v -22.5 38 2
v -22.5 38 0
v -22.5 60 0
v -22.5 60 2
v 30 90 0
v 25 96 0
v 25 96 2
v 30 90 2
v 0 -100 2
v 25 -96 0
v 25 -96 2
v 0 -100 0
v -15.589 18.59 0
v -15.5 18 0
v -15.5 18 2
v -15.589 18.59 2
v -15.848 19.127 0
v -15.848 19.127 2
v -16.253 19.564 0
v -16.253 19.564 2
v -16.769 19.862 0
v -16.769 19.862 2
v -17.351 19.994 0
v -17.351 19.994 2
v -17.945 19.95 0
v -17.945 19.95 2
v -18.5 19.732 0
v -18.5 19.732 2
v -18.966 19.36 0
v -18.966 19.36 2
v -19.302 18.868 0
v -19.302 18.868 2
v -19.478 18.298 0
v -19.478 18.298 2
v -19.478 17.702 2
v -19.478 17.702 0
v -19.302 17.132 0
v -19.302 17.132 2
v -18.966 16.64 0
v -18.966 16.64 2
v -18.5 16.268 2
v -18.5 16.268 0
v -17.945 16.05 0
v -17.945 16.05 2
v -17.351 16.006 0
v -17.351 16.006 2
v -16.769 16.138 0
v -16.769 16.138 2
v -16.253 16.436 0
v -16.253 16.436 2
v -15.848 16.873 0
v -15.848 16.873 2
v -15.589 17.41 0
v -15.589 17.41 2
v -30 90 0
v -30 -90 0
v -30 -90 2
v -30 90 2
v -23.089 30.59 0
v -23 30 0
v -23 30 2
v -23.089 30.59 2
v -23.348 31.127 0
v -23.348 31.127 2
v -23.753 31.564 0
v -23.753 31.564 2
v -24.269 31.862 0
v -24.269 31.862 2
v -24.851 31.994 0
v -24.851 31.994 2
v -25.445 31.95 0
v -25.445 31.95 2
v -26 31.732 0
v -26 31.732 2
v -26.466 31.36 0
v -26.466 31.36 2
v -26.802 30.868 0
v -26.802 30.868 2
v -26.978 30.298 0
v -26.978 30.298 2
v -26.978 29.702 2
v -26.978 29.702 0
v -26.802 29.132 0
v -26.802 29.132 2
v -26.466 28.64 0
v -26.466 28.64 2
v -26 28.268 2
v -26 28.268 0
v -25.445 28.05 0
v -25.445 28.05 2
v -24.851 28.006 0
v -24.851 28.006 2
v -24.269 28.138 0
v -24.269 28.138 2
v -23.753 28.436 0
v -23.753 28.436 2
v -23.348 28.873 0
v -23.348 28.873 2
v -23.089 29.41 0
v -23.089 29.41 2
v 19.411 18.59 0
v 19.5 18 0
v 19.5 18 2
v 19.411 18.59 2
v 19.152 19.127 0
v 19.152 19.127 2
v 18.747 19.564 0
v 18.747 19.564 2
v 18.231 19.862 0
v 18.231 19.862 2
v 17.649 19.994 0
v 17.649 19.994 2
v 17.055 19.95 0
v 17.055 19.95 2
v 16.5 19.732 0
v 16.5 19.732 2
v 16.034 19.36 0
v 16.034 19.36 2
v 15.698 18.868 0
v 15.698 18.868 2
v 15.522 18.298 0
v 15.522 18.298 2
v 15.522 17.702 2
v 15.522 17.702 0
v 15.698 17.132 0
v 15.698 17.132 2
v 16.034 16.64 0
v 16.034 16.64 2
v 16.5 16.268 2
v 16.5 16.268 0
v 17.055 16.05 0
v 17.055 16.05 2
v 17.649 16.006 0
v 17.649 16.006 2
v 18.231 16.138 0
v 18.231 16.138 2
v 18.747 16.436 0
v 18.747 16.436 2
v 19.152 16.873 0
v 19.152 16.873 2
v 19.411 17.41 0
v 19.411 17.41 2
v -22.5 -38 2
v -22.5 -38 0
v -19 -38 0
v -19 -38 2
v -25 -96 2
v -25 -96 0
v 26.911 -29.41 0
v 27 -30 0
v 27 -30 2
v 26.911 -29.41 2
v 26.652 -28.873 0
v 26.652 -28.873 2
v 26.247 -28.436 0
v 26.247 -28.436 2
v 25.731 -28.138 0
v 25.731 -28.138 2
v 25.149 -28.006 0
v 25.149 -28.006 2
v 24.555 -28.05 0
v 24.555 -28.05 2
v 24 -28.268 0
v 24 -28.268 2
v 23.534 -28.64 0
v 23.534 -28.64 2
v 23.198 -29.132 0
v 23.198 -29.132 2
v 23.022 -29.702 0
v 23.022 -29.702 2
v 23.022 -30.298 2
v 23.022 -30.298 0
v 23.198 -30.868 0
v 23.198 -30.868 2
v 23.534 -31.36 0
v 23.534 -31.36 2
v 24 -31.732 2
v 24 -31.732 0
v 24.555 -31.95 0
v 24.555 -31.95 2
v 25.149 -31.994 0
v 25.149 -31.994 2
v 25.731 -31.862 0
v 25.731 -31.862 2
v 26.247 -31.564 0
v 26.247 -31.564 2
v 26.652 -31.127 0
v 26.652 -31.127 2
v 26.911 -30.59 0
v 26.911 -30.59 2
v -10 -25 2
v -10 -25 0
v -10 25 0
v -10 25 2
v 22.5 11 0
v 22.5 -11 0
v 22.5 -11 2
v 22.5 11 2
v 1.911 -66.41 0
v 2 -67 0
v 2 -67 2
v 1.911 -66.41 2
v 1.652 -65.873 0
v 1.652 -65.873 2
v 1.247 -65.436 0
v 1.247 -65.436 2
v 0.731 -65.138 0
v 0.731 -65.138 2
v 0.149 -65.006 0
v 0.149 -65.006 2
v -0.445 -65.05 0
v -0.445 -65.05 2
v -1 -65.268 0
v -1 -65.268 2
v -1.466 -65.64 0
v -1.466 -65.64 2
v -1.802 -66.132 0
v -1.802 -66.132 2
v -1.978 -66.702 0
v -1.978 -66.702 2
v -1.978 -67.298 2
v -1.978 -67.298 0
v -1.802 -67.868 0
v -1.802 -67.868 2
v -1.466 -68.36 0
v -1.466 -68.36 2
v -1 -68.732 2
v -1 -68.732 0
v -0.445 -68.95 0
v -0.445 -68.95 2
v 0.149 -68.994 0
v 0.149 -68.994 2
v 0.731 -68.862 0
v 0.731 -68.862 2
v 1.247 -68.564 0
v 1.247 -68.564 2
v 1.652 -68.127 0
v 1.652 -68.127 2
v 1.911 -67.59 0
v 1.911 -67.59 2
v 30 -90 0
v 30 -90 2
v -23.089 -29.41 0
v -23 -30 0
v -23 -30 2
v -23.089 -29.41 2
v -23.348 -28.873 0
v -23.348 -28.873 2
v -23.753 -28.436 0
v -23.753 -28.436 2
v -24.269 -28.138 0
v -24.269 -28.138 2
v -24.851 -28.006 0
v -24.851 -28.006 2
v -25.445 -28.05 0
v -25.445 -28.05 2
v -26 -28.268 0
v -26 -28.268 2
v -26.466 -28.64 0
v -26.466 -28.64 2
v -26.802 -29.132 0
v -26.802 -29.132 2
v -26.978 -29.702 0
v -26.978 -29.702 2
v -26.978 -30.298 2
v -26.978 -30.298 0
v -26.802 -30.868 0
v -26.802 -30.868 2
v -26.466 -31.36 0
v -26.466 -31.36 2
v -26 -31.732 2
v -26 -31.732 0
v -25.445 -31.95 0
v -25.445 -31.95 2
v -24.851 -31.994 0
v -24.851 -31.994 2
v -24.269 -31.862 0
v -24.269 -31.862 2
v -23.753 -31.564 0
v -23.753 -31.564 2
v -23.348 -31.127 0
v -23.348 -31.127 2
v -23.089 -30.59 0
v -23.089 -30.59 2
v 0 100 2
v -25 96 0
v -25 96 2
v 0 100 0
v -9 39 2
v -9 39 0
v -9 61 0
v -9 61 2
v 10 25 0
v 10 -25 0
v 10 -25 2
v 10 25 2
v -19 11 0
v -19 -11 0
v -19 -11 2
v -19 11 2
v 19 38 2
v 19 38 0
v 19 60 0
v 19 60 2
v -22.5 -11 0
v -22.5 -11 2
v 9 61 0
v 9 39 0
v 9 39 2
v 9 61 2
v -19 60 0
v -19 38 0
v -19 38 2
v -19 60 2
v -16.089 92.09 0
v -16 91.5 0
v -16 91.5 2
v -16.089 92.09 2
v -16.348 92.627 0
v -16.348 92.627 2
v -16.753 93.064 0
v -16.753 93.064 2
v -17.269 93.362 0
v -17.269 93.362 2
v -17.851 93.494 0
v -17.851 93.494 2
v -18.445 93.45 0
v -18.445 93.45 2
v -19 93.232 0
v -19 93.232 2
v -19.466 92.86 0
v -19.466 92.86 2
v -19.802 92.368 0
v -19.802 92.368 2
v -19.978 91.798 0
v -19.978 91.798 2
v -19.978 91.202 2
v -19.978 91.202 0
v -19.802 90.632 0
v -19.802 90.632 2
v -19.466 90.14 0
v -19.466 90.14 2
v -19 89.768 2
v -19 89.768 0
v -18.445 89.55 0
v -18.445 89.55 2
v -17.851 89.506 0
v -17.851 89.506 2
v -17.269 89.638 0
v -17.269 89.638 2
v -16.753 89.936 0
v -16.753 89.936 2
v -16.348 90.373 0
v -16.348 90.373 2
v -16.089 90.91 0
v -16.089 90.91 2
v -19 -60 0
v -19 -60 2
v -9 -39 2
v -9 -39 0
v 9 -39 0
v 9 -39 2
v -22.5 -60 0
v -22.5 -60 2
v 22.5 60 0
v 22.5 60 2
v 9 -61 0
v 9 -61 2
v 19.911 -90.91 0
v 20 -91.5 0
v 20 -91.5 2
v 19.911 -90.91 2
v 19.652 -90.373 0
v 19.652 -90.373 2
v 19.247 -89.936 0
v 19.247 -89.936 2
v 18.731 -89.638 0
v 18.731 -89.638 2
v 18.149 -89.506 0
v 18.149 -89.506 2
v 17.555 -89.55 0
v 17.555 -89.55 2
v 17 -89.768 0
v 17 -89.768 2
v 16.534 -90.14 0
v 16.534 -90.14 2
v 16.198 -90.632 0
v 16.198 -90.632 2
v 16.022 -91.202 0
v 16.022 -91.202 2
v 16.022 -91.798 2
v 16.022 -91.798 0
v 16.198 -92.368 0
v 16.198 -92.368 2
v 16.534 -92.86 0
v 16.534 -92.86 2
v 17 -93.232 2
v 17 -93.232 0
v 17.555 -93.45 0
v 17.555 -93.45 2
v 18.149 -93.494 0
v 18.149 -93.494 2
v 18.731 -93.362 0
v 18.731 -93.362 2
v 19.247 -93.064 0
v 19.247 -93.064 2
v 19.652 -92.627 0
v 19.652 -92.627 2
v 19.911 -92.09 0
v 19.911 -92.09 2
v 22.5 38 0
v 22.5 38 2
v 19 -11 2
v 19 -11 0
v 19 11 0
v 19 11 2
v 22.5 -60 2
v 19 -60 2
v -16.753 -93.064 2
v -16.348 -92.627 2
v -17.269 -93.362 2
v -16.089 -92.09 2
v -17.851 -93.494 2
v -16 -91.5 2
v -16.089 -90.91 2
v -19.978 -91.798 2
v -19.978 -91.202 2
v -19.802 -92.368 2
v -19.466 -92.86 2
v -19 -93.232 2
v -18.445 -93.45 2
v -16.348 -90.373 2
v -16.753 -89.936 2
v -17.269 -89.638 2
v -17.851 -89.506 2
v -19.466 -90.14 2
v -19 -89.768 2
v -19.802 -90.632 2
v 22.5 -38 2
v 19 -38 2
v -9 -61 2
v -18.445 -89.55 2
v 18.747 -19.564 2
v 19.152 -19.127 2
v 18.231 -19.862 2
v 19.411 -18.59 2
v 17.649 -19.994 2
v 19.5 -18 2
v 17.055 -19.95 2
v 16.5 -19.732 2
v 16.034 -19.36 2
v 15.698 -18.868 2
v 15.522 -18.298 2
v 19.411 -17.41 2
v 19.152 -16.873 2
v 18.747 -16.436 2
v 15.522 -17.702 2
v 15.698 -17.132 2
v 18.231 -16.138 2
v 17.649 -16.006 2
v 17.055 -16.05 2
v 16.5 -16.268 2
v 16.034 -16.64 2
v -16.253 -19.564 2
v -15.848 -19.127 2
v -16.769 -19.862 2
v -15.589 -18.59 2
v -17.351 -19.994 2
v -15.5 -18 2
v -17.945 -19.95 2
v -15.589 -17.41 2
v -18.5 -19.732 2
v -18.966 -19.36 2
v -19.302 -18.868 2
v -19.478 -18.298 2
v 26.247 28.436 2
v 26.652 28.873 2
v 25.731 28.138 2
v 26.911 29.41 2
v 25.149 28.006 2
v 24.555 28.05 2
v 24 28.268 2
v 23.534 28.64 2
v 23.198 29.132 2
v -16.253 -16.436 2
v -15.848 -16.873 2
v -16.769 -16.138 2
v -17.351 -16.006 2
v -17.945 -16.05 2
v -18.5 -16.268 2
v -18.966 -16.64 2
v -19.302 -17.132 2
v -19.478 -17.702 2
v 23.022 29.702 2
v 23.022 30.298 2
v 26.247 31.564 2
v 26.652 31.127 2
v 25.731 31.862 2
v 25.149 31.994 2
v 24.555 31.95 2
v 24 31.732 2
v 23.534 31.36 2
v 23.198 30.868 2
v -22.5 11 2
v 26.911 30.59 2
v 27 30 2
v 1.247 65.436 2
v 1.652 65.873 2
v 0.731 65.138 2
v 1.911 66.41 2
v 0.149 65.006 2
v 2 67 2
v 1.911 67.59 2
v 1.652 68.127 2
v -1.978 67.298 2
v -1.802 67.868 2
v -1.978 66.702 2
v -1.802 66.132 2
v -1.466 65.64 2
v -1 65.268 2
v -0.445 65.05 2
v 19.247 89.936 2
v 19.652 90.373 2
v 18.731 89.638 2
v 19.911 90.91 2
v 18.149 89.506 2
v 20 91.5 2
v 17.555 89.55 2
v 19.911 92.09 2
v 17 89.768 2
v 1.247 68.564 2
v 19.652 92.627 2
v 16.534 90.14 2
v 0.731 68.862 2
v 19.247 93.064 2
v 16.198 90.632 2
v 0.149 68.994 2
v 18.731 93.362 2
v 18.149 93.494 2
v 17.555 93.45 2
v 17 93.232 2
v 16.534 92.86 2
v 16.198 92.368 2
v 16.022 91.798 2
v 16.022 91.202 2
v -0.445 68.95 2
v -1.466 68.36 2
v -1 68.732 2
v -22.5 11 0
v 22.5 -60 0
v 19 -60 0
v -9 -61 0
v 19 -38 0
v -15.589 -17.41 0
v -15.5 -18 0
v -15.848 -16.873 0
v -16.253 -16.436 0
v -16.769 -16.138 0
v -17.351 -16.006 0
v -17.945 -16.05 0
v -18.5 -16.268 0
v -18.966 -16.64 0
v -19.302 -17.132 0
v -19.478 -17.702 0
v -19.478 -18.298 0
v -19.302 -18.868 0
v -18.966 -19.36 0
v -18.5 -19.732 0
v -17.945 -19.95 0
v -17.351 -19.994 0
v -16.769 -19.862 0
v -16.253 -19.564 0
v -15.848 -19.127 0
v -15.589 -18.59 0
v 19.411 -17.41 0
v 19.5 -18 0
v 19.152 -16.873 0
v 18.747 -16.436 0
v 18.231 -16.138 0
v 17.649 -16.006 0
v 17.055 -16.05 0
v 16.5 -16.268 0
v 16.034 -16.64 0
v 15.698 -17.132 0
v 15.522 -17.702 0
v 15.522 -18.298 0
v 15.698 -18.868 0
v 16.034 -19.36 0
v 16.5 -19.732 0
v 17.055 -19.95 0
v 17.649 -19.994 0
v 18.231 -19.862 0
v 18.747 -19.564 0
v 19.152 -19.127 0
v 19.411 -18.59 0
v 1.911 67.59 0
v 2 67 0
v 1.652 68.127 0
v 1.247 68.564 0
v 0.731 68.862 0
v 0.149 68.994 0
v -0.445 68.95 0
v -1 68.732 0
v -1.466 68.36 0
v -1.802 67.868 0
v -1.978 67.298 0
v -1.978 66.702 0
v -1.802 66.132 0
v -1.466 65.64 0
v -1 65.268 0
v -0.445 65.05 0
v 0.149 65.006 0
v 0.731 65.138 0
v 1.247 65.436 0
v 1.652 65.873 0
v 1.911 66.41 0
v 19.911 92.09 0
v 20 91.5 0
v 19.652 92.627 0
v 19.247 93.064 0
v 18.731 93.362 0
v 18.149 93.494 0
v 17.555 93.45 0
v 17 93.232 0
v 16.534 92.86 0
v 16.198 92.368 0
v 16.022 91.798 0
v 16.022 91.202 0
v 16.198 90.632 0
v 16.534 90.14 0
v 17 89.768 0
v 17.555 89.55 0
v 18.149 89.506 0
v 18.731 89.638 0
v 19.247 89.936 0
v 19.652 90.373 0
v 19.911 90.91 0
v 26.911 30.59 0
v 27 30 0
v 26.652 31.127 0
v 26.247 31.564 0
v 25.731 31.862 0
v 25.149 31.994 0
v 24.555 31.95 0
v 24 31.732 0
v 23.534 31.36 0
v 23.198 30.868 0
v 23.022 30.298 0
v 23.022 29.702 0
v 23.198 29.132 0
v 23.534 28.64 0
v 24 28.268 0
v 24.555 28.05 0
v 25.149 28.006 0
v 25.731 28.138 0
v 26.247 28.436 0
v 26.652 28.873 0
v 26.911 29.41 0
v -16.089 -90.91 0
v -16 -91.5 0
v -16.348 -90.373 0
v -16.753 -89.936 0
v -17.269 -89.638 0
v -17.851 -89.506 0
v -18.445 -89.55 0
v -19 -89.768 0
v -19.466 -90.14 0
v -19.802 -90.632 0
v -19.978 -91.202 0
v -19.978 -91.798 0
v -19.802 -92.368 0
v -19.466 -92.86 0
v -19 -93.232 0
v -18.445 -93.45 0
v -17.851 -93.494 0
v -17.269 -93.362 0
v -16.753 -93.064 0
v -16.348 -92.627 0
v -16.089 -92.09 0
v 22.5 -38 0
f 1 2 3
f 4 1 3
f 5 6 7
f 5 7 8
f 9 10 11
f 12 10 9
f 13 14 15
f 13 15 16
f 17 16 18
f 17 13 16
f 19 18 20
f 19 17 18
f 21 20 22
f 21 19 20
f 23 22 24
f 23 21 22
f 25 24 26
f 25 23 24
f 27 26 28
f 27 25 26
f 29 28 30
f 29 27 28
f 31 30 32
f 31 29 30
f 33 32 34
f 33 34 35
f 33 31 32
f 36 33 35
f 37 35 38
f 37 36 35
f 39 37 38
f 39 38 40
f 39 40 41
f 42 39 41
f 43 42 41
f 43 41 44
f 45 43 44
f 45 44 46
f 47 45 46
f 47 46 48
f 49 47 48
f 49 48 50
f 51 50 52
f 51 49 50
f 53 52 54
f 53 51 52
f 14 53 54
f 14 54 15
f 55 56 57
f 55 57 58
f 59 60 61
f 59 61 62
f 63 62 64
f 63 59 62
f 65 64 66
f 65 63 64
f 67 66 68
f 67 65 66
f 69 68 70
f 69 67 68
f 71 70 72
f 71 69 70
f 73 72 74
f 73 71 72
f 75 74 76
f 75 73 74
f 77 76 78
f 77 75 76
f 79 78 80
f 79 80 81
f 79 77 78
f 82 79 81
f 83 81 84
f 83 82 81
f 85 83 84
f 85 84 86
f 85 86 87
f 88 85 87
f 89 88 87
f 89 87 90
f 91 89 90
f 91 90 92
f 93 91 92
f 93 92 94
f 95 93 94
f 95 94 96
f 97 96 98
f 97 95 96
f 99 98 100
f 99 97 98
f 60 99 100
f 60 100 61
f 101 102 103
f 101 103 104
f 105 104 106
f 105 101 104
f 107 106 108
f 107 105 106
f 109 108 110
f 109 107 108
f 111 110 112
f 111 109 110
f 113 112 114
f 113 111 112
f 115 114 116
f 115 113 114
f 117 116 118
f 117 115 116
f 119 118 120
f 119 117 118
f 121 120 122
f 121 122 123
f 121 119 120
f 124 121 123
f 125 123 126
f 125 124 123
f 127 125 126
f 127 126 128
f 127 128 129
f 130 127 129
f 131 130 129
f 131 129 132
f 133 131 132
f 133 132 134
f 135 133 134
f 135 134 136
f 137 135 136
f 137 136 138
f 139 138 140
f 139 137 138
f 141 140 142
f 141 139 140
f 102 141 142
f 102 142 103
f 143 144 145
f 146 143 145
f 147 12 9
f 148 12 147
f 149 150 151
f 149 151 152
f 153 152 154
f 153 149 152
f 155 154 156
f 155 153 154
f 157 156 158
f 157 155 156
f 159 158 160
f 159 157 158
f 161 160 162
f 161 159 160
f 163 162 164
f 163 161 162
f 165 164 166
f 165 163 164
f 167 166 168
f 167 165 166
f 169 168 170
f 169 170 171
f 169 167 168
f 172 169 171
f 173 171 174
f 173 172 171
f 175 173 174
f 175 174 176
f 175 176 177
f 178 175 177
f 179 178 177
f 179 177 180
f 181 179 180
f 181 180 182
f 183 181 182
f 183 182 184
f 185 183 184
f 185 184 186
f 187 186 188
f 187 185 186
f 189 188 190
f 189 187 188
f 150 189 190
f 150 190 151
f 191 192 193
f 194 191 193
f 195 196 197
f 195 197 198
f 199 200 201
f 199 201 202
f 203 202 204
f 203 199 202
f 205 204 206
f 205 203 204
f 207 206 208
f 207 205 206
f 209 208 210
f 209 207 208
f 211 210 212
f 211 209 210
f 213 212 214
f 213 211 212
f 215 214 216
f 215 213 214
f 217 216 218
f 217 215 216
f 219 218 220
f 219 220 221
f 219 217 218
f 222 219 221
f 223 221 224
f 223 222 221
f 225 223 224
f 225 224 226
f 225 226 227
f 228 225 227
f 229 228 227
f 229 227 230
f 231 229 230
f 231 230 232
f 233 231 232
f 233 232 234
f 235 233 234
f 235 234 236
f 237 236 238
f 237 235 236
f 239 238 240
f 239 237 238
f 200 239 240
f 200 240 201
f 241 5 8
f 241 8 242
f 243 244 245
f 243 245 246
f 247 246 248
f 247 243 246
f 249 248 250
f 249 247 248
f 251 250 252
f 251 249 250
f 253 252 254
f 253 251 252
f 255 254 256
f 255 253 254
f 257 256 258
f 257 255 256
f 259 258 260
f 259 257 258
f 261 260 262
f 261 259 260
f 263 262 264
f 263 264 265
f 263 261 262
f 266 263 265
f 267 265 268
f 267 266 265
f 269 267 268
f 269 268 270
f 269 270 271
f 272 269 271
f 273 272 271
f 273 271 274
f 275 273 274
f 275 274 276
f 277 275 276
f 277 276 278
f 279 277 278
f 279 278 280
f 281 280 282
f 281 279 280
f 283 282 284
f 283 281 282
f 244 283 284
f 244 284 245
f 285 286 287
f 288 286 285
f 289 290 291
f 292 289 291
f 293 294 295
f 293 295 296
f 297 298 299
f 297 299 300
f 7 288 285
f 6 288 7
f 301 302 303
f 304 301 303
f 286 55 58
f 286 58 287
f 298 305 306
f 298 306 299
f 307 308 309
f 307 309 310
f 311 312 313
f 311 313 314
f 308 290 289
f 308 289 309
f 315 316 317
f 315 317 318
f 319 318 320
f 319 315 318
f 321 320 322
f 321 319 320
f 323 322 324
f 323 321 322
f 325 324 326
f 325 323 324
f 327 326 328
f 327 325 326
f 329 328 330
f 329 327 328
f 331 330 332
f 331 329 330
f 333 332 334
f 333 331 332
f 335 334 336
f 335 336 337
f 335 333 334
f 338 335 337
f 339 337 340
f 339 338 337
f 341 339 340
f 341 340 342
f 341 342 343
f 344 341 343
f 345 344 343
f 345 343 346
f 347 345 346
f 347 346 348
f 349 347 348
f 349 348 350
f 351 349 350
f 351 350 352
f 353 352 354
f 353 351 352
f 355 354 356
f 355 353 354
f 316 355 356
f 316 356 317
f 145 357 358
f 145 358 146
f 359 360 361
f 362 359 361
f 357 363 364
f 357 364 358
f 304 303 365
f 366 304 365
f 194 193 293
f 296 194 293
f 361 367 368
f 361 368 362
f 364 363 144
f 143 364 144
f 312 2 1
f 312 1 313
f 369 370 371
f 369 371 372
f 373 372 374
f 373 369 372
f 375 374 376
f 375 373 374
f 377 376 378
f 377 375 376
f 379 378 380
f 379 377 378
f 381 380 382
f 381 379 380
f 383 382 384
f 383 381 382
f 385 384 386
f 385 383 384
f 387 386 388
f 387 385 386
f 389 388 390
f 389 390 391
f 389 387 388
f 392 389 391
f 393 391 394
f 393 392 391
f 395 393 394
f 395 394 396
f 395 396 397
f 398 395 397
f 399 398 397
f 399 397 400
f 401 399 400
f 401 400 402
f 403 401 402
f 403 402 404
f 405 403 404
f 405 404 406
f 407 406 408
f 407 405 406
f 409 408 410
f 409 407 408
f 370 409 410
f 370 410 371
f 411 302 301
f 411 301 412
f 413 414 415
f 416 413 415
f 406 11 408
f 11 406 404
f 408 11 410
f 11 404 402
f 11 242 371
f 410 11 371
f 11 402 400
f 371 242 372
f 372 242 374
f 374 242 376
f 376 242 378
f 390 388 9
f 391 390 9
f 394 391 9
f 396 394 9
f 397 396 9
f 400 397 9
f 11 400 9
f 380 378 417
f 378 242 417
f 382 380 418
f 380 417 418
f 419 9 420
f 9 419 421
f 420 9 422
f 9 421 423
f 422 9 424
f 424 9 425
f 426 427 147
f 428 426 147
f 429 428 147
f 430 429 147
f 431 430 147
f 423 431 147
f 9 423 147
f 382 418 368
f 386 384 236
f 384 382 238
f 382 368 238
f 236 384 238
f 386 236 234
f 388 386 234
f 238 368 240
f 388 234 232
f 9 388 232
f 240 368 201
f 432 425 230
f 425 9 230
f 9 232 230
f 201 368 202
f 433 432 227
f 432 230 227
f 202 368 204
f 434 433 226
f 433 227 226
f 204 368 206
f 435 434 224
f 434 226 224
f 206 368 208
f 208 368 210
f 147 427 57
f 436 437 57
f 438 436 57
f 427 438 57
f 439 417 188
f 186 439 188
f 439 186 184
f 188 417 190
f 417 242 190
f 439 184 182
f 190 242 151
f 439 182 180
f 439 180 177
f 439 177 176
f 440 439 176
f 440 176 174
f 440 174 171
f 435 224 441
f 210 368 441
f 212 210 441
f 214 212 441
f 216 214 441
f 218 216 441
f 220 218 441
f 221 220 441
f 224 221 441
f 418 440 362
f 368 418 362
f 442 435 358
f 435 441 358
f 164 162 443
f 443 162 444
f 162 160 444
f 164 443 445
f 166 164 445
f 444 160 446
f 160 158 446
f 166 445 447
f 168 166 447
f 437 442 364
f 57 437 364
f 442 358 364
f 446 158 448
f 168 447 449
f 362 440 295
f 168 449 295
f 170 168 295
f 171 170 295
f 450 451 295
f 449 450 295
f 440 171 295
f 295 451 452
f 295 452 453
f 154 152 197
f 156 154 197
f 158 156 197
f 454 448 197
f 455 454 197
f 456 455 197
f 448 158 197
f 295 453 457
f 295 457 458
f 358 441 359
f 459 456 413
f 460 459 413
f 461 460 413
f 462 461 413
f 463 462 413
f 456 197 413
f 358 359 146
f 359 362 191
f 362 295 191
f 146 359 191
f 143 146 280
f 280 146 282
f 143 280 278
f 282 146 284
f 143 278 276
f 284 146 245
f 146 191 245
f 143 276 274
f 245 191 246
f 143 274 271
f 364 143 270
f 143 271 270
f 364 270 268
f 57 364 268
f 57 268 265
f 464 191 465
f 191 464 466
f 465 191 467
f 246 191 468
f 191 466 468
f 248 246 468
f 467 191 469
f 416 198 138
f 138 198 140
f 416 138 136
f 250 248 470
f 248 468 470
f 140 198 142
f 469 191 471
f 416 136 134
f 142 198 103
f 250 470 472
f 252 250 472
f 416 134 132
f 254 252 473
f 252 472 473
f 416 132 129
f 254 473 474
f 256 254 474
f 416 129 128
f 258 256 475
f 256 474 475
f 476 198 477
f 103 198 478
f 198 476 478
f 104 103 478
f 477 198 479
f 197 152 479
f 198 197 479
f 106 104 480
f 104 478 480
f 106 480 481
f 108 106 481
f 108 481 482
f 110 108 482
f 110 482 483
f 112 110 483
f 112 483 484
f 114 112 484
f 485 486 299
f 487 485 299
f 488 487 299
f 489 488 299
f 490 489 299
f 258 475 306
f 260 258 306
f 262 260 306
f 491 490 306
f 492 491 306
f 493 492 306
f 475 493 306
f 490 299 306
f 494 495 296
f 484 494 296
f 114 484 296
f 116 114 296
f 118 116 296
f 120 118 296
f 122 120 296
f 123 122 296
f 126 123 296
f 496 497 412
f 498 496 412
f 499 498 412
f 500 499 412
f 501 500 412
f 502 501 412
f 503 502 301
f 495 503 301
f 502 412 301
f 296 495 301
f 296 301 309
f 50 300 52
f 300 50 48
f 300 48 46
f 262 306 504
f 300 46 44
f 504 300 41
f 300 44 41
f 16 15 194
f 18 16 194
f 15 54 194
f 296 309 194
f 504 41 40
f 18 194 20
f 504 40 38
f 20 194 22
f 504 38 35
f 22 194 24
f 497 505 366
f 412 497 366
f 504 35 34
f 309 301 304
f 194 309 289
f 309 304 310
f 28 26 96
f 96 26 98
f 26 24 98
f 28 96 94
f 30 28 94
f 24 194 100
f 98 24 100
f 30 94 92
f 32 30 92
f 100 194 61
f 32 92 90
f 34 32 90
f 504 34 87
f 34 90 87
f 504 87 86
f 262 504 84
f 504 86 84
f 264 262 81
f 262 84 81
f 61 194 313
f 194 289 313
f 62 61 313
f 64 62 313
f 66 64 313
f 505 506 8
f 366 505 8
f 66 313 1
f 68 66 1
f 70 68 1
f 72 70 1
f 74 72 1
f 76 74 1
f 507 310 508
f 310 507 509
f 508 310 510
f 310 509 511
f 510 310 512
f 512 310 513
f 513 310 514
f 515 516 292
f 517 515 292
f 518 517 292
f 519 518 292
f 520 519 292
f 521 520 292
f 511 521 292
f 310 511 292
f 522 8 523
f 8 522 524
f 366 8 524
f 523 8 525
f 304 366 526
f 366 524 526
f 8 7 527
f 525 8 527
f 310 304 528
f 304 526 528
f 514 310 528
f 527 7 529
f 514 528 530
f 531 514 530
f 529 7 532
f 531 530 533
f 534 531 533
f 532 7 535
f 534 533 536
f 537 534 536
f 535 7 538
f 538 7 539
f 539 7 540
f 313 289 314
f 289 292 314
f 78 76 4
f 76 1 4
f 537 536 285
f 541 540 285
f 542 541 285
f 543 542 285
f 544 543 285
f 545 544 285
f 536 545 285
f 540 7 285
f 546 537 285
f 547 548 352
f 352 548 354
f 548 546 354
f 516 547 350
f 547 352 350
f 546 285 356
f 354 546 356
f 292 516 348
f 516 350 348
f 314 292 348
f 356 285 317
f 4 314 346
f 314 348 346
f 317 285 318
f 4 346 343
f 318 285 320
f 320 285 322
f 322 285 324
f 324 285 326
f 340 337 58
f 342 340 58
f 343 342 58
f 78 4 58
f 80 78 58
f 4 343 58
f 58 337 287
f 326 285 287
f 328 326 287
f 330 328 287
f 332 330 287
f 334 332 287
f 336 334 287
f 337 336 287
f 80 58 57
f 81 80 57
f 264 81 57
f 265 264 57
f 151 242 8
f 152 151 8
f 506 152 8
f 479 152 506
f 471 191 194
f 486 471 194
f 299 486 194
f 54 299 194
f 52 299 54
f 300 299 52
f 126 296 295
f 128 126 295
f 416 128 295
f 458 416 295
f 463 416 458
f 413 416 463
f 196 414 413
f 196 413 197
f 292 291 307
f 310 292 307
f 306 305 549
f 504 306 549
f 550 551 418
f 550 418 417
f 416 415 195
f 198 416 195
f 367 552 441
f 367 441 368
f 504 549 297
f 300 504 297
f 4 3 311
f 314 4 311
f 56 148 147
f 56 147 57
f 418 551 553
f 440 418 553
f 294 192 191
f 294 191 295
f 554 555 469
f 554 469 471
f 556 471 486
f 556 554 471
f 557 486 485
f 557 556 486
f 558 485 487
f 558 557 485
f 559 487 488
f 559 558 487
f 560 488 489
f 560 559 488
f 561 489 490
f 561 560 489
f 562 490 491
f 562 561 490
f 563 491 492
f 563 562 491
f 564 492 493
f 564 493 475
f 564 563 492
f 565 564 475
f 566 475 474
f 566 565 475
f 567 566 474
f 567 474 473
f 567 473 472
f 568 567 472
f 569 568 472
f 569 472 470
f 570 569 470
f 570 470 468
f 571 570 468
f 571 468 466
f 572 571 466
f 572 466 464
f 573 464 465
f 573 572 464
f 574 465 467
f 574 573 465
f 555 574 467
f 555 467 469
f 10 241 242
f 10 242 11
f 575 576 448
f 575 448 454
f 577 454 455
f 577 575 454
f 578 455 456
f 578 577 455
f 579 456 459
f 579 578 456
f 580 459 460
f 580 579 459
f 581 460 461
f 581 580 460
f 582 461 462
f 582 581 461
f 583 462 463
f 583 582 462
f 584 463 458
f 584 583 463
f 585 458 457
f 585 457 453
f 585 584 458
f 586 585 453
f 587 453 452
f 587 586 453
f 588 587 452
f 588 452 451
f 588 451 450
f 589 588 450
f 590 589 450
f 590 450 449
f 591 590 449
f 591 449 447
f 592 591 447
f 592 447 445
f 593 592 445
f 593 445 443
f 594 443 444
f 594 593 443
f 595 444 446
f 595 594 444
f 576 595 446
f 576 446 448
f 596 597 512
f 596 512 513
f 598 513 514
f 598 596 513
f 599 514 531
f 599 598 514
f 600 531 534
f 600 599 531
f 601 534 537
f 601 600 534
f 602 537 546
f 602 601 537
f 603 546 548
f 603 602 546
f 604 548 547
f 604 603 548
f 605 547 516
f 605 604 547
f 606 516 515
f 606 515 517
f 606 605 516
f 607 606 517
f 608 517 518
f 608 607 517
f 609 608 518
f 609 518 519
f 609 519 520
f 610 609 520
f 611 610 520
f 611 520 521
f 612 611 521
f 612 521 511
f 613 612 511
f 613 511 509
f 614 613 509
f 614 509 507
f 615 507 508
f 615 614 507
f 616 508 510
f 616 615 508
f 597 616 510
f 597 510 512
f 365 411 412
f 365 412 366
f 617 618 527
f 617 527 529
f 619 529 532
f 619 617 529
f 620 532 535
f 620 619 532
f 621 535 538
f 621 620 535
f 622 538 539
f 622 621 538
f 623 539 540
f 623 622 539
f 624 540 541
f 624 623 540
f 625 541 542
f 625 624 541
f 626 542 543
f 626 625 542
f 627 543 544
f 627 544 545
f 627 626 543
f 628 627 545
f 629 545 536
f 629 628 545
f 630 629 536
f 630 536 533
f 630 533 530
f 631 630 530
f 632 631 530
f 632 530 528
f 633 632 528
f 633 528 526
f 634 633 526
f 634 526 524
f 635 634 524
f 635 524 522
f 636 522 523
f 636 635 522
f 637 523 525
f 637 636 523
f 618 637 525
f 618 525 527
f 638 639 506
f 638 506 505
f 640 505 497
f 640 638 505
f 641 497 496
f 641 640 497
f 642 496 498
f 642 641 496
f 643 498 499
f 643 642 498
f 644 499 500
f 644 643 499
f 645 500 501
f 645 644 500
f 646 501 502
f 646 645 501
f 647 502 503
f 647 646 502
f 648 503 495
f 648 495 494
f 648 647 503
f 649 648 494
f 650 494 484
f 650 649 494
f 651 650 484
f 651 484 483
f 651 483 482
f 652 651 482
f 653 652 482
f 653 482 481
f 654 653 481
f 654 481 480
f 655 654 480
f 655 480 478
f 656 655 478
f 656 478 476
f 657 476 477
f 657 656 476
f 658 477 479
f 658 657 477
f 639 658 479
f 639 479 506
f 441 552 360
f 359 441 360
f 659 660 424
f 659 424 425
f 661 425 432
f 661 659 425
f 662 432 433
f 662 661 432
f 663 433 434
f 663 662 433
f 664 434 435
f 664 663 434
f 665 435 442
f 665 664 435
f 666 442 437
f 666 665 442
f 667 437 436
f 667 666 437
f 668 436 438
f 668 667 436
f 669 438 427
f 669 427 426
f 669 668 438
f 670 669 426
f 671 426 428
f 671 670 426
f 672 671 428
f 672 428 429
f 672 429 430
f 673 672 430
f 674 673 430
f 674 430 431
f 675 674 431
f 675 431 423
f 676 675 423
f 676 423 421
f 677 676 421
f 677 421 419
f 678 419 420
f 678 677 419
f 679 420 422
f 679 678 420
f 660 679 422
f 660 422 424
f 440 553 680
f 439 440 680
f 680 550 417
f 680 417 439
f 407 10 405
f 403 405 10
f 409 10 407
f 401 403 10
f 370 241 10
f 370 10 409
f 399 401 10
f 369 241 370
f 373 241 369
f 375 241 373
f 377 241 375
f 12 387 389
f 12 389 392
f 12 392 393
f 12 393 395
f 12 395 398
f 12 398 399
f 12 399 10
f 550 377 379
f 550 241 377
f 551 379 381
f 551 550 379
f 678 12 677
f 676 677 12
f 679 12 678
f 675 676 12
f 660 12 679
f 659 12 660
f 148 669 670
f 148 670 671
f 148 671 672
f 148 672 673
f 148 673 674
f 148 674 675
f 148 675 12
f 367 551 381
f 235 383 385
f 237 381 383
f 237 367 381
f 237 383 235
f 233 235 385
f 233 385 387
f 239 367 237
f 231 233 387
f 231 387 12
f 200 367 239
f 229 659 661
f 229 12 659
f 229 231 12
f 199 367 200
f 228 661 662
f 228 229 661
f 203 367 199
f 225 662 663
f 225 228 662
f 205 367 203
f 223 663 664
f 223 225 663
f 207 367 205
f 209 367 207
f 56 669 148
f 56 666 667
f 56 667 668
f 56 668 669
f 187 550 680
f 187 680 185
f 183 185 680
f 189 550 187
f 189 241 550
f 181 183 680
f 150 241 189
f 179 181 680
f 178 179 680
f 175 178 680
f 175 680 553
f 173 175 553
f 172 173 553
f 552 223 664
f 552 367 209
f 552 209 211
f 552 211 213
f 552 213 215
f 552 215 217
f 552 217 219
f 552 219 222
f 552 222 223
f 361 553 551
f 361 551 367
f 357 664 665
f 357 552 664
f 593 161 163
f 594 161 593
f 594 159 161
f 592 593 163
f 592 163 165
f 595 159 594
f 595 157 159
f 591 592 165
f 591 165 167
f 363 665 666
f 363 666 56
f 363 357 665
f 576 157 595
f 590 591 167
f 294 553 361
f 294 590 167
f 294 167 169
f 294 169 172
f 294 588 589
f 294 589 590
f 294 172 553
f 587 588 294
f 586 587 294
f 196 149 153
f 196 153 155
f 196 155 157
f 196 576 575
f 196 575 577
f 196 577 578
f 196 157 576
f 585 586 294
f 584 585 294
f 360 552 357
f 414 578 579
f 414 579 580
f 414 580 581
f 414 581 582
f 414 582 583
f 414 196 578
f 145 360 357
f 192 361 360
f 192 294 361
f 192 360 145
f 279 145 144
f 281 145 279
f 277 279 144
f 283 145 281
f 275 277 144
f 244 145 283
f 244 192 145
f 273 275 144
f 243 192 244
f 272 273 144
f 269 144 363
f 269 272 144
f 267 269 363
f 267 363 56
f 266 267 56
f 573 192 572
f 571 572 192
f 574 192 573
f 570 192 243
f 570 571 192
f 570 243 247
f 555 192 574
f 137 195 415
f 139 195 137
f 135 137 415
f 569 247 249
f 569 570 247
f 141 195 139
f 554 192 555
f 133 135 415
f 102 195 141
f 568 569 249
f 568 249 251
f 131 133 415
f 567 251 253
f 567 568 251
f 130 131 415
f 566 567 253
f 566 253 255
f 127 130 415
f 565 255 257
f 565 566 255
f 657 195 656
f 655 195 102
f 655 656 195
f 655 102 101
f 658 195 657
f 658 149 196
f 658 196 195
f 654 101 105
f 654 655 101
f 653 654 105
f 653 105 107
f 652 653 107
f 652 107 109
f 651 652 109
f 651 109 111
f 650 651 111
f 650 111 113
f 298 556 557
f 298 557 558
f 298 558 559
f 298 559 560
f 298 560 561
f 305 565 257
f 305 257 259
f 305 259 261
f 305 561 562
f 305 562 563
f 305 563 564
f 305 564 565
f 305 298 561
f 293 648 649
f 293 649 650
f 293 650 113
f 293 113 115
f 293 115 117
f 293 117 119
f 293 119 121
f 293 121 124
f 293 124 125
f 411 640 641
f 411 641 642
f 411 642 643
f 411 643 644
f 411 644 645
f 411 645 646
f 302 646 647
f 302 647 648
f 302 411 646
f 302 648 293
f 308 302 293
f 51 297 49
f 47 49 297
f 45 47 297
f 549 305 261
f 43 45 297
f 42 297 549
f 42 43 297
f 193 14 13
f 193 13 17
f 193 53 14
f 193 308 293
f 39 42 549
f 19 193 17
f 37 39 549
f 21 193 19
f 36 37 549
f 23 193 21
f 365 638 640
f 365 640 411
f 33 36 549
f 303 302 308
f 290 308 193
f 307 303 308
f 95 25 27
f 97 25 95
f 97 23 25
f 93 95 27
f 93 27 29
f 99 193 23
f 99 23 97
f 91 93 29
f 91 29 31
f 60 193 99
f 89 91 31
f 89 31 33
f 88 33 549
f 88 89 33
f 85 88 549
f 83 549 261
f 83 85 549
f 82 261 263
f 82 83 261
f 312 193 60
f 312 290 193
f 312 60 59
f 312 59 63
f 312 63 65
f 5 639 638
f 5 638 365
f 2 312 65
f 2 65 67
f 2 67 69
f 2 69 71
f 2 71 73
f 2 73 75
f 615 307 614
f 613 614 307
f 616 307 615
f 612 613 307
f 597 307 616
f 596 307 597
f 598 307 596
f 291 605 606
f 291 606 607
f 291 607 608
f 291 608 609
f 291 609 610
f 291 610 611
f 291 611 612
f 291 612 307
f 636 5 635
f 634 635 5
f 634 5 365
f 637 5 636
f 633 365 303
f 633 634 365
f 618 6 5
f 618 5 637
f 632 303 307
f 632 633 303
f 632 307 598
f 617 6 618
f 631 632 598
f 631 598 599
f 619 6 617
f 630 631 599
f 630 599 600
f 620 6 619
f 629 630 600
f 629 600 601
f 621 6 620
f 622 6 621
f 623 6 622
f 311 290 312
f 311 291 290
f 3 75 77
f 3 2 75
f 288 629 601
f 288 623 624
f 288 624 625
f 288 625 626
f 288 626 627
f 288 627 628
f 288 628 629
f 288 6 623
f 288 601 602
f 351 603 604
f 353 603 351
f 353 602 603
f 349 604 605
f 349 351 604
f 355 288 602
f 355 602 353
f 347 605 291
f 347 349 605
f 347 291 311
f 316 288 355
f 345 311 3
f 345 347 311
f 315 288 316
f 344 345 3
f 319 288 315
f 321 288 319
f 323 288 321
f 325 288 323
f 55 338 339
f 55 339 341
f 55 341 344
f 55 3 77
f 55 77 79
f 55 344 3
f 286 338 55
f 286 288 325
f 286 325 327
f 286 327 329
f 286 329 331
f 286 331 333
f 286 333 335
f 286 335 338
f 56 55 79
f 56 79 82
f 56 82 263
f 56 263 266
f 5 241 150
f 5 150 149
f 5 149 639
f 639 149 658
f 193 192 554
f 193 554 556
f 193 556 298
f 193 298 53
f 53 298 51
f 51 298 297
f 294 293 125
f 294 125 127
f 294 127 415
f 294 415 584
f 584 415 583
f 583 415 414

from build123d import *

# Parameters (mm, degrees)
SKETCH1_R           = 2
SKETCH1_W           = 20
SKETCH1_H           = 50
SKETCH1_W_2         = 3.5
SKETCH1_H_2         = 22
SKETCH1_W_3         = 18
BOSS_EXTRUDE1_DEPTH = 2


with BuildPart() as part:
    # Sketch1 → Boss-Extrude1 (new body)
    with BuildSketch(Plane.XY):
        Polygon((0, -100), (-25, -96), (-30, -90), (-30, 90), (-25, 96), (0, 100), (25, 96), (30, 90), (30, -90), (25, -96), align=None)
        with Locations((-18, -91.5)):
            Circle(SKETCH1_R, mode=Mode.SUBTRACT)
        with Locations((-25, -30)):
            Circle(SKETCH1_R, mode=Mode.SUBTRACT)
        with Locations((-17.5, -18)):
            Circle(SKETCH1_R, mode=Mode.SUBTRACT)
        with Locations((0, -67)):
            Circle(SKETCH1_R, mode=Mode.SUBTRACT)
        with Locations((17.5, -18)):
            Circle(SKETCH1_R, mode=Mode.SUBTRACT)
        with Locations((25, -30)):
            Circle(SKETCH1_R, mode=Mode.SUBTRACT)
        with Locations((18, -91.5)):
            Circle(SKETCH1_R, mode=Mode.SUBTRACT)
        with Locations((18, 91.5)):
            Circle(SKETCH1_R, mode=Mode.SUBTRACT)
        with Locations((25, 30)):
            Circle(SKETCH1_R, mode=Mode.SUBTRACT)
        with Locations((17.5, 18)):
            Circle(SKETCH1_R, mode=Mode.SUBTRACT)
        with Locations((0, 67)):
            Circle(SKETCH1_R, mode=Mode.SUBTRACT)
        with Locations((-17.5, 18)):
            Circle(SKETCH1_R, mode=Mode.SUBTRACT)
        with Locations((-25, 30)):
            Circle(SKETCH1_R, mode=Mode.SUBTRACT)
        with Locations((-18, 91.5)):
            Circle(SKETCH1_R, mode=Mode.SUBTRACT)
        Rectangle(SKETCH1_W, SKETCH1_H, mode=Mode.SUBTRACT)
        with Locations((-20.75, -49)):
            Rectangle(SKETCH1_W_2, SKETCH1_H_2, mode=Mode.SUBTRACT)
        with Locations((0, -50)):
            Rectangle(SKETCH1_W_3, SKETCH1_H_2, mode=Mode.SUBTRACT)
        with Locations((-20.75, 0)):
            Rectangle(SKETCH1_W_2, SKETCH1_H_2, mode=Mode.SUBTRACT)
        with Locations((20.75, 0)):
            Rectangle(SKETCH1_W_2, SKETCH1_H_2, mode=Mode.SUBTRACT)
        with Locations((20.75, -49)):
            Rectangle(SKETCH1_W_2, SKETCH1_H_2, mode=Mode.SUBTRACT)
        with Locations((20.75, 49)):
            Rectangle(SKETCH1_W_2, SKETCH1_H_2, mode=Mode.SUBTRACT)
        with Locations((0, 50)):
            Rectangle(SKETCH1_W_3, SKETCH1_H_2, mode=Mode.SUBTRACT)
        with Locations((-20.75, 49)):
            Rectangle(SKETCH1_W_2, SKETCH1_H_2, mode=Mode.SUBTRACT)
    extrude(amount=BOSS_EXTRUDE1_DEPTH)


solid = part.part
